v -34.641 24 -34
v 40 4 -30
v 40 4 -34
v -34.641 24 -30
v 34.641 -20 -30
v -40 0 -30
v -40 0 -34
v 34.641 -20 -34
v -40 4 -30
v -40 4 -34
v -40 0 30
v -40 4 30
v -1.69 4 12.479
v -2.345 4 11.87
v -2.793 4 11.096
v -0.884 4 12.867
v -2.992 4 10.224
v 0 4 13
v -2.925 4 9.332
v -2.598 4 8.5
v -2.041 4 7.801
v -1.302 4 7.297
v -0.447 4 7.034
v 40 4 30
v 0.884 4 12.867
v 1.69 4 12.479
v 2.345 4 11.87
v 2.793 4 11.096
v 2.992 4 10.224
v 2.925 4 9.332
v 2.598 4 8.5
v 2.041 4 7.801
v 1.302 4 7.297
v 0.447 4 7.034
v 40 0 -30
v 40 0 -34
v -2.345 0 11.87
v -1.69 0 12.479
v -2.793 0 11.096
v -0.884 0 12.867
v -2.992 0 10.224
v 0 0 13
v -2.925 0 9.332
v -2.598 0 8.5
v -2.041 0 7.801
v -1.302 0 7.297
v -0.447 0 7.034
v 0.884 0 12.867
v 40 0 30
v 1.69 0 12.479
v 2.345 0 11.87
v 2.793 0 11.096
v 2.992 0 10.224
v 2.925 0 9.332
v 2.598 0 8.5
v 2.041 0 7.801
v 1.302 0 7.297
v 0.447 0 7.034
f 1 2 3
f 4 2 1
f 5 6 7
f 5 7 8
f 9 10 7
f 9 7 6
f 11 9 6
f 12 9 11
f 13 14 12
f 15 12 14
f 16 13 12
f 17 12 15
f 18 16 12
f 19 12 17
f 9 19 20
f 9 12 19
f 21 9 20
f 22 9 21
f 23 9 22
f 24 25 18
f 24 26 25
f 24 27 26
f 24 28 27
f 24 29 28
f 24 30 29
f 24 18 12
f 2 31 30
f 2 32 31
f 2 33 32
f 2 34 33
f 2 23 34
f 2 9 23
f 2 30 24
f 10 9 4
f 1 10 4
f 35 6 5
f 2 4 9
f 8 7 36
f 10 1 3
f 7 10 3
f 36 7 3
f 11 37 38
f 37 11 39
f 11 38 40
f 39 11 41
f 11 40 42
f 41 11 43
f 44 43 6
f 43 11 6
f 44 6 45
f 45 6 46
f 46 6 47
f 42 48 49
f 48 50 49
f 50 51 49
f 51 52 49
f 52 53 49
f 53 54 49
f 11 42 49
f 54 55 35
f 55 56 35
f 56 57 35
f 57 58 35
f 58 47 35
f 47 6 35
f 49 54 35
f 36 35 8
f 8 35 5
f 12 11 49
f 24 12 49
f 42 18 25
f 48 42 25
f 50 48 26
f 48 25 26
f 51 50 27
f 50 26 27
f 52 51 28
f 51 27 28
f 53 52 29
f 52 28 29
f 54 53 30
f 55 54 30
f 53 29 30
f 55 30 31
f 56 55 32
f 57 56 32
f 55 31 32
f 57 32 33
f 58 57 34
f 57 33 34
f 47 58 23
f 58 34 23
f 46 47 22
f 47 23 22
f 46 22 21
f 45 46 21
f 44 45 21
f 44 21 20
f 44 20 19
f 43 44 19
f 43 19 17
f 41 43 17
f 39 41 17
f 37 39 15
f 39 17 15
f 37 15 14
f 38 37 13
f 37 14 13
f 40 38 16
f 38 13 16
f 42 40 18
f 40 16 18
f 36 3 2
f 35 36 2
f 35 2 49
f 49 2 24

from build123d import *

# Parameters (mm, degrees)
SKETCH1_W           = 80
SKETCH1_H           = 60
BOSS_EXTRUDE1_DEPTH = 4
SKETCH2_R           = 3
CUT_EXTRUDE1_DEPTH  = 4
BOSS_EXTRUDE4_DEPTH = 4
SKETCH9_W           = 80
SKETCH9_H           = 4
BOSS_EXTRUDE5_DEPTH = 54
CUT_EXTRUDE5_DEPTH  = 54
CUT_EXTRUDE6_DEPTH  = 54
CUT_EXTRUDE7_DEPTH  = 54


with BuildPart() as part:
    # Sketch1 → Boss-Extrude1 (new body)
    with BuildSketch(Plane(origin=(0, 0, 0), x_dir=(1, 0, 0), z_dir=(0, 1, 0))):
        Rectangle(SKETCH1_W, SKETCH1_H)
    extrude(amount=BOSS_EXTRUDE1_DEPTH)

    # Sketch2 → Cut-Extrude1 (cut)
    with BuildSketch(Plane(origin=(0, 4, 0), x_dir=(1, 0, 0), z_dir=(0, 1, 0))):
        with Locations(Location((0, -10, 0), (0, 0, 270))):
            Circle(SKETCH2_R)
    extrude(amount=-CUT_EXTRUDE1_DEPTH, mode=Mode.SUBTRACT)



with BuildPart() as body_2:
    # Sketch8 → Boss-Extrude4 (new body)
    with BuildSketch(Plane(origin=(0, 0, -30), x_dir=(-1, 0, 0), z_dir=(0, 0, -1))):
        with BuildLine():
            Line((-40, 4), (37.274066103, 24.705523608))
            ThreePointArc((37.274066103, 24.705523608), (39.31558891, 14.442095378), (40, 4))
            Line((40, 4), (-40, 4))
        make_face()
    extrude(amount=BOSS_EXTRUDE4_DEPTH)


with BuildPart() as part_1:
    add(part.part)

    add(body_2.part)  # Boss-Extrude5 merges body 2
    # Sketch9 → Boss-Extrude5 (add)
    with BuildSketch(Plane.XZ.offset(-4)):
        with Locations((0, -32)):
            Rectangle(SKETCH9_W, SKETCH9_H)
    extrude(amount=BOSS_EXTRUDE5_DEPTH)

    # Sketch10 → Cut-Extrude5 (cut)
    with BuildSketch(Plane.XY.offset(-30)):
        Polygon((-40, 4), (-34.641016151, 24), (-48.042949513, 27.591037221), align=None)
    extrude(amount=-CUT_EXTRUDE5_DEPTH, mode=Mode.SUBTRACT)

    # Sketch11 → Cut-Extrude6 (cut)
    with BuildSketch(Plane.XY.offset(-30)):
        Polygon((40, 0), (26.602540378, -50), (60.406284328, -52.474789136), align=None)
    extrude(amount=-CUT_EXTRUDE6_DEPTH, mode=Mode.SUBTRACT)

    # Sketch12 → Cut-Extrude7 (cut)
    with BuildSketch(Plane.XY.offset(-30)):
        Polygon((-40, 0), (34.641016151, -20), (30.373618341, -54.228709826), (-68.422743557, -51.185946857), align=None)
    extrude(amount=-CUT_EXTRUDE7_DEPTH, mode=Mode.SUBTRACT)


solid = part_1.part
